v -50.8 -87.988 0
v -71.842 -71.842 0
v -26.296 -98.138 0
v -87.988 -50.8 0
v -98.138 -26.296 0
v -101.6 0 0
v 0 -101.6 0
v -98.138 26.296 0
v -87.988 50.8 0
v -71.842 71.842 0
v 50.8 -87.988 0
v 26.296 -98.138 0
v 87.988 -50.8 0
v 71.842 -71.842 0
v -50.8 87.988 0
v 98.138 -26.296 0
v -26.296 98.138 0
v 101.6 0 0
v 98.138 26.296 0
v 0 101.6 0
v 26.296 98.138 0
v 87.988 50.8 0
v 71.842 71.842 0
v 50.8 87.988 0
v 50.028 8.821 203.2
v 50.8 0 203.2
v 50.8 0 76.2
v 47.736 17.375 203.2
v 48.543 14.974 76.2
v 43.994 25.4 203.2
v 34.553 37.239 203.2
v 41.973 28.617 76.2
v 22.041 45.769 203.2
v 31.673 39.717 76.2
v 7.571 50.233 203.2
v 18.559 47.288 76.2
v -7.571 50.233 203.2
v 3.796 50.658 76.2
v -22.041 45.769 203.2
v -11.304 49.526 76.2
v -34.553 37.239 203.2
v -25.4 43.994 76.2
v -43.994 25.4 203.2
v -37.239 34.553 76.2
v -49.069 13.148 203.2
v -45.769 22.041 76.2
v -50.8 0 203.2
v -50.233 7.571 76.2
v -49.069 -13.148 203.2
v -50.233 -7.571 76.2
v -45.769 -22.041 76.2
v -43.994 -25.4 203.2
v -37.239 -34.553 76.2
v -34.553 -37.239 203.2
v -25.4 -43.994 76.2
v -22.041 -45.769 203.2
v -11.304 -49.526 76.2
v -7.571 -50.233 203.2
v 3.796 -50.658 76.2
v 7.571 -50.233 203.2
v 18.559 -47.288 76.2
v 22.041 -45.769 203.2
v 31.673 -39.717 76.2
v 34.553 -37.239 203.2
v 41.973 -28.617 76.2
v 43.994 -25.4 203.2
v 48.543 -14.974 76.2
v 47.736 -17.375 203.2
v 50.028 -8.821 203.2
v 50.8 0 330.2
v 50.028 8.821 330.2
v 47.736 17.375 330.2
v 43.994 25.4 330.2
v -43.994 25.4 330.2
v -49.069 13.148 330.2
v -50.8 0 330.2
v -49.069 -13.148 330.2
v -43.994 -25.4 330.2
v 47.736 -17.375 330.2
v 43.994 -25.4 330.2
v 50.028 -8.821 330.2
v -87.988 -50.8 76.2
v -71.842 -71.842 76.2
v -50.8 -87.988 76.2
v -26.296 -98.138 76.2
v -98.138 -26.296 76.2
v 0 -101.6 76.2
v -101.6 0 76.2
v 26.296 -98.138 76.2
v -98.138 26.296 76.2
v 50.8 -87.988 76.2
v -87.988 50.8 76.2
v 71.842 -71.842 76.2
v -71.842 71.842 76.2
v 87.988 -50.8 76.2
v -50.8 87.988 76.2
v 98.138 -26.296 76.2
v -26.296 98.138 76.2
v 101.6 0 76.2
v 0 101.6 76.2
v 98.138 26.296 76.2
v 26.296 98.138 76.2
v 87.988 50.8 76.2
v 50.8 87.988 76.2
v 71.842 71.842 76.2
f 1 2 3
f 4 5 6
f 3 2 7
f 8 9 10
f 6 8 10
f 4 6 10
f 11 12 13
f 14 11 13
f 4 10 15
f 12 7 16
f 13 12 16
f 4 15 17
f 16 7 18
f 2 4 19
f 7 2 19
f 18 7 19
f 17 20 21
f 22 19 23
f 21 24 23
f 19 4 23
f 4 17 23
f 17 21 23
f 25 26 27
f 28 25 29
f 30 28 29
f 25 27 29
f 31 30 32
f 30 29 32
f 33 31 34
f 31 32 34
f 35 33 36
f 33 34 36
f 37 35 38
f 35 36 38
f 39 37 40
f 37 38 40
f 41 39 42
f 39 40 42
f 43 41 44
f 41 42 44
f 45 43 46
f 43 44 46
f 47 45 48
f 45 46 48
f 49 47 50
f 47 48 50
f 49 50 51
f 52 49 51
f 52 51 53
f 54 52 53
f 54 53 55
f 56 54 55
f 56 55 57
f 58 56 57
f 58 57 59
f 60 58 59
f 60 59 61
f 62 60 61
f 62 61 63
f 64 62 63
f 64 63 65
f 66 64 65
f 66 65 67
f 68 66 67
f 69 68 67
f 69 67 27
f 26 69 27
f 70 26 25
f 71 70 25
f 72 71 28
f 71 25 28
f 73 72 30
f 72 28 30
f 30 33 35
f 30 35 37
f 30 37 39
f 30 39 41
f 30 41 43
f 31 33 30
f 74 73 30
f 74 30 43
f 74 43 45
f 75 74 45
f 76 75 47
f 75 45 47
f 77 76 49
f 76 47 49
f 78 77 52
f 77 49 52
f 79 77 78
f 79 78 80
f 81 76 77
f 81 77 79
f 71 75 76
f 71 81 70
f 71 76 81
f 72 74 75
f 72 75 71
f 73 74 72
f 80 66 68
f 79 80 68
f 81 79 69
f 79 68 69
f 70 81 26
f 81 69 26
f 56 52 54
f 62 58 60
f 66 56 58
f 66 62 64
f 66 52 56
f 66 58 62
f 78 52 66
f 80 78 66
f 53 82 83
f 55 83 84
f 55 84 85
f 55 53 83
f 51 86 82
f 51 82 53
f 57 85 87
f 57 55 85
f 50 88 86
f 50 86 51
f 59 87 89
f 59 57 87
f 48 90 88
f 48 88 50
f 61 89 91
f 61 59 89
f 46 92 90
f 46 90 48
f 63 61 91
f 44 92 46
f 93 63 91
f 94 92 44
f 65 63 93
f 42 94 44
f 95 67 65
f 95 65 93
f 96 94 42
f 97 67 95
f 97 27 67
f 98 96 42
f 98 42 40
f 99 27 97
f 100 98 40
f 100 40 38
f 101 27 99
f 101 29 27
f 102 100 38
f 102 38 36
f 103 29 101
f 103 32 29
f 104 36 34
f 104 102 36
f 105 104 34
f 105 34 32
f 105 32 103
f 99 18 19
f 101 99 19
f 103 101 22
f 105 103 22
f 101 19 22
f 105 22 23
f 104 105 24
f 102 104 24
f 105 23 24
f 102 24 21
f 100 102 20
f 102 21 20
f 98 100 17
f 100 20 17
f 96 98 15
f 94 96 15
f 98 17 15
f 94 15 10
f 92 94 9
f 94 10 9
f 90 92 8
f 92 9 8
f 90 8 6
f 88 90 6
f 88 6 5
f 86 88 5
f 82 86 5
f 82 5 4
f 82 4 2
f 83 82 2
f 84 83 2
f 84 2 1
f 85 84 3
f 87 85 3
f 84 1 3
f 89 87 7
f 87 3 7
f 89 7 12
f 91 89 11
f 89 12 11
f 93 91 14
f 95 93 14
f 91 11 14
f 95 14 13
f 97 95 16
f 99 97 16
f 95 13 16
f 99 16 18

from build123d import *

# Parameters (mm, degrees)
F0_R     = 101.6
F1_DEPTH = 76.2
F2_R     = 50.8
F3_DEPTH = 127
F5_DEPTH = 127


with BuildPart() as f1:
    # F0 (on Top) → F1 (new body)
    with BuildSketch(Plane.XY):
        Circle(F0_R)
    extrude(amount=F1_DEPTH)

    # F2 (on face) → F3 (join)
    with BuildSketch(Plane.XY.offset(76.2)):
        Circle(F2_R)
    extrude(amount=F3_DEPTH)

    # F4 (on face) → F5 (join)
    with BuildSketch(Plane.XY.offset(203.2)):
        with BuildLine():
            Line((43.994091, 25.4), (-43.994091, 25.4))
            ThreePointArc((-43.994091, 25.4), (-50.8, 0), (-43.994091, -25.4))
            Line((-43.994091, -25.4), (43.994091, -25.4))
            ThreePointArc((43.994091, -25.4), (49.069032, -13.148007), (50.8, 0))
            ThreePointArc((50.8, 0), (49.069032, 13.148007), (43.994091, 25.4))
        make_face()
    extrude(amount=F5_DEPTH)


solid = f1.part
